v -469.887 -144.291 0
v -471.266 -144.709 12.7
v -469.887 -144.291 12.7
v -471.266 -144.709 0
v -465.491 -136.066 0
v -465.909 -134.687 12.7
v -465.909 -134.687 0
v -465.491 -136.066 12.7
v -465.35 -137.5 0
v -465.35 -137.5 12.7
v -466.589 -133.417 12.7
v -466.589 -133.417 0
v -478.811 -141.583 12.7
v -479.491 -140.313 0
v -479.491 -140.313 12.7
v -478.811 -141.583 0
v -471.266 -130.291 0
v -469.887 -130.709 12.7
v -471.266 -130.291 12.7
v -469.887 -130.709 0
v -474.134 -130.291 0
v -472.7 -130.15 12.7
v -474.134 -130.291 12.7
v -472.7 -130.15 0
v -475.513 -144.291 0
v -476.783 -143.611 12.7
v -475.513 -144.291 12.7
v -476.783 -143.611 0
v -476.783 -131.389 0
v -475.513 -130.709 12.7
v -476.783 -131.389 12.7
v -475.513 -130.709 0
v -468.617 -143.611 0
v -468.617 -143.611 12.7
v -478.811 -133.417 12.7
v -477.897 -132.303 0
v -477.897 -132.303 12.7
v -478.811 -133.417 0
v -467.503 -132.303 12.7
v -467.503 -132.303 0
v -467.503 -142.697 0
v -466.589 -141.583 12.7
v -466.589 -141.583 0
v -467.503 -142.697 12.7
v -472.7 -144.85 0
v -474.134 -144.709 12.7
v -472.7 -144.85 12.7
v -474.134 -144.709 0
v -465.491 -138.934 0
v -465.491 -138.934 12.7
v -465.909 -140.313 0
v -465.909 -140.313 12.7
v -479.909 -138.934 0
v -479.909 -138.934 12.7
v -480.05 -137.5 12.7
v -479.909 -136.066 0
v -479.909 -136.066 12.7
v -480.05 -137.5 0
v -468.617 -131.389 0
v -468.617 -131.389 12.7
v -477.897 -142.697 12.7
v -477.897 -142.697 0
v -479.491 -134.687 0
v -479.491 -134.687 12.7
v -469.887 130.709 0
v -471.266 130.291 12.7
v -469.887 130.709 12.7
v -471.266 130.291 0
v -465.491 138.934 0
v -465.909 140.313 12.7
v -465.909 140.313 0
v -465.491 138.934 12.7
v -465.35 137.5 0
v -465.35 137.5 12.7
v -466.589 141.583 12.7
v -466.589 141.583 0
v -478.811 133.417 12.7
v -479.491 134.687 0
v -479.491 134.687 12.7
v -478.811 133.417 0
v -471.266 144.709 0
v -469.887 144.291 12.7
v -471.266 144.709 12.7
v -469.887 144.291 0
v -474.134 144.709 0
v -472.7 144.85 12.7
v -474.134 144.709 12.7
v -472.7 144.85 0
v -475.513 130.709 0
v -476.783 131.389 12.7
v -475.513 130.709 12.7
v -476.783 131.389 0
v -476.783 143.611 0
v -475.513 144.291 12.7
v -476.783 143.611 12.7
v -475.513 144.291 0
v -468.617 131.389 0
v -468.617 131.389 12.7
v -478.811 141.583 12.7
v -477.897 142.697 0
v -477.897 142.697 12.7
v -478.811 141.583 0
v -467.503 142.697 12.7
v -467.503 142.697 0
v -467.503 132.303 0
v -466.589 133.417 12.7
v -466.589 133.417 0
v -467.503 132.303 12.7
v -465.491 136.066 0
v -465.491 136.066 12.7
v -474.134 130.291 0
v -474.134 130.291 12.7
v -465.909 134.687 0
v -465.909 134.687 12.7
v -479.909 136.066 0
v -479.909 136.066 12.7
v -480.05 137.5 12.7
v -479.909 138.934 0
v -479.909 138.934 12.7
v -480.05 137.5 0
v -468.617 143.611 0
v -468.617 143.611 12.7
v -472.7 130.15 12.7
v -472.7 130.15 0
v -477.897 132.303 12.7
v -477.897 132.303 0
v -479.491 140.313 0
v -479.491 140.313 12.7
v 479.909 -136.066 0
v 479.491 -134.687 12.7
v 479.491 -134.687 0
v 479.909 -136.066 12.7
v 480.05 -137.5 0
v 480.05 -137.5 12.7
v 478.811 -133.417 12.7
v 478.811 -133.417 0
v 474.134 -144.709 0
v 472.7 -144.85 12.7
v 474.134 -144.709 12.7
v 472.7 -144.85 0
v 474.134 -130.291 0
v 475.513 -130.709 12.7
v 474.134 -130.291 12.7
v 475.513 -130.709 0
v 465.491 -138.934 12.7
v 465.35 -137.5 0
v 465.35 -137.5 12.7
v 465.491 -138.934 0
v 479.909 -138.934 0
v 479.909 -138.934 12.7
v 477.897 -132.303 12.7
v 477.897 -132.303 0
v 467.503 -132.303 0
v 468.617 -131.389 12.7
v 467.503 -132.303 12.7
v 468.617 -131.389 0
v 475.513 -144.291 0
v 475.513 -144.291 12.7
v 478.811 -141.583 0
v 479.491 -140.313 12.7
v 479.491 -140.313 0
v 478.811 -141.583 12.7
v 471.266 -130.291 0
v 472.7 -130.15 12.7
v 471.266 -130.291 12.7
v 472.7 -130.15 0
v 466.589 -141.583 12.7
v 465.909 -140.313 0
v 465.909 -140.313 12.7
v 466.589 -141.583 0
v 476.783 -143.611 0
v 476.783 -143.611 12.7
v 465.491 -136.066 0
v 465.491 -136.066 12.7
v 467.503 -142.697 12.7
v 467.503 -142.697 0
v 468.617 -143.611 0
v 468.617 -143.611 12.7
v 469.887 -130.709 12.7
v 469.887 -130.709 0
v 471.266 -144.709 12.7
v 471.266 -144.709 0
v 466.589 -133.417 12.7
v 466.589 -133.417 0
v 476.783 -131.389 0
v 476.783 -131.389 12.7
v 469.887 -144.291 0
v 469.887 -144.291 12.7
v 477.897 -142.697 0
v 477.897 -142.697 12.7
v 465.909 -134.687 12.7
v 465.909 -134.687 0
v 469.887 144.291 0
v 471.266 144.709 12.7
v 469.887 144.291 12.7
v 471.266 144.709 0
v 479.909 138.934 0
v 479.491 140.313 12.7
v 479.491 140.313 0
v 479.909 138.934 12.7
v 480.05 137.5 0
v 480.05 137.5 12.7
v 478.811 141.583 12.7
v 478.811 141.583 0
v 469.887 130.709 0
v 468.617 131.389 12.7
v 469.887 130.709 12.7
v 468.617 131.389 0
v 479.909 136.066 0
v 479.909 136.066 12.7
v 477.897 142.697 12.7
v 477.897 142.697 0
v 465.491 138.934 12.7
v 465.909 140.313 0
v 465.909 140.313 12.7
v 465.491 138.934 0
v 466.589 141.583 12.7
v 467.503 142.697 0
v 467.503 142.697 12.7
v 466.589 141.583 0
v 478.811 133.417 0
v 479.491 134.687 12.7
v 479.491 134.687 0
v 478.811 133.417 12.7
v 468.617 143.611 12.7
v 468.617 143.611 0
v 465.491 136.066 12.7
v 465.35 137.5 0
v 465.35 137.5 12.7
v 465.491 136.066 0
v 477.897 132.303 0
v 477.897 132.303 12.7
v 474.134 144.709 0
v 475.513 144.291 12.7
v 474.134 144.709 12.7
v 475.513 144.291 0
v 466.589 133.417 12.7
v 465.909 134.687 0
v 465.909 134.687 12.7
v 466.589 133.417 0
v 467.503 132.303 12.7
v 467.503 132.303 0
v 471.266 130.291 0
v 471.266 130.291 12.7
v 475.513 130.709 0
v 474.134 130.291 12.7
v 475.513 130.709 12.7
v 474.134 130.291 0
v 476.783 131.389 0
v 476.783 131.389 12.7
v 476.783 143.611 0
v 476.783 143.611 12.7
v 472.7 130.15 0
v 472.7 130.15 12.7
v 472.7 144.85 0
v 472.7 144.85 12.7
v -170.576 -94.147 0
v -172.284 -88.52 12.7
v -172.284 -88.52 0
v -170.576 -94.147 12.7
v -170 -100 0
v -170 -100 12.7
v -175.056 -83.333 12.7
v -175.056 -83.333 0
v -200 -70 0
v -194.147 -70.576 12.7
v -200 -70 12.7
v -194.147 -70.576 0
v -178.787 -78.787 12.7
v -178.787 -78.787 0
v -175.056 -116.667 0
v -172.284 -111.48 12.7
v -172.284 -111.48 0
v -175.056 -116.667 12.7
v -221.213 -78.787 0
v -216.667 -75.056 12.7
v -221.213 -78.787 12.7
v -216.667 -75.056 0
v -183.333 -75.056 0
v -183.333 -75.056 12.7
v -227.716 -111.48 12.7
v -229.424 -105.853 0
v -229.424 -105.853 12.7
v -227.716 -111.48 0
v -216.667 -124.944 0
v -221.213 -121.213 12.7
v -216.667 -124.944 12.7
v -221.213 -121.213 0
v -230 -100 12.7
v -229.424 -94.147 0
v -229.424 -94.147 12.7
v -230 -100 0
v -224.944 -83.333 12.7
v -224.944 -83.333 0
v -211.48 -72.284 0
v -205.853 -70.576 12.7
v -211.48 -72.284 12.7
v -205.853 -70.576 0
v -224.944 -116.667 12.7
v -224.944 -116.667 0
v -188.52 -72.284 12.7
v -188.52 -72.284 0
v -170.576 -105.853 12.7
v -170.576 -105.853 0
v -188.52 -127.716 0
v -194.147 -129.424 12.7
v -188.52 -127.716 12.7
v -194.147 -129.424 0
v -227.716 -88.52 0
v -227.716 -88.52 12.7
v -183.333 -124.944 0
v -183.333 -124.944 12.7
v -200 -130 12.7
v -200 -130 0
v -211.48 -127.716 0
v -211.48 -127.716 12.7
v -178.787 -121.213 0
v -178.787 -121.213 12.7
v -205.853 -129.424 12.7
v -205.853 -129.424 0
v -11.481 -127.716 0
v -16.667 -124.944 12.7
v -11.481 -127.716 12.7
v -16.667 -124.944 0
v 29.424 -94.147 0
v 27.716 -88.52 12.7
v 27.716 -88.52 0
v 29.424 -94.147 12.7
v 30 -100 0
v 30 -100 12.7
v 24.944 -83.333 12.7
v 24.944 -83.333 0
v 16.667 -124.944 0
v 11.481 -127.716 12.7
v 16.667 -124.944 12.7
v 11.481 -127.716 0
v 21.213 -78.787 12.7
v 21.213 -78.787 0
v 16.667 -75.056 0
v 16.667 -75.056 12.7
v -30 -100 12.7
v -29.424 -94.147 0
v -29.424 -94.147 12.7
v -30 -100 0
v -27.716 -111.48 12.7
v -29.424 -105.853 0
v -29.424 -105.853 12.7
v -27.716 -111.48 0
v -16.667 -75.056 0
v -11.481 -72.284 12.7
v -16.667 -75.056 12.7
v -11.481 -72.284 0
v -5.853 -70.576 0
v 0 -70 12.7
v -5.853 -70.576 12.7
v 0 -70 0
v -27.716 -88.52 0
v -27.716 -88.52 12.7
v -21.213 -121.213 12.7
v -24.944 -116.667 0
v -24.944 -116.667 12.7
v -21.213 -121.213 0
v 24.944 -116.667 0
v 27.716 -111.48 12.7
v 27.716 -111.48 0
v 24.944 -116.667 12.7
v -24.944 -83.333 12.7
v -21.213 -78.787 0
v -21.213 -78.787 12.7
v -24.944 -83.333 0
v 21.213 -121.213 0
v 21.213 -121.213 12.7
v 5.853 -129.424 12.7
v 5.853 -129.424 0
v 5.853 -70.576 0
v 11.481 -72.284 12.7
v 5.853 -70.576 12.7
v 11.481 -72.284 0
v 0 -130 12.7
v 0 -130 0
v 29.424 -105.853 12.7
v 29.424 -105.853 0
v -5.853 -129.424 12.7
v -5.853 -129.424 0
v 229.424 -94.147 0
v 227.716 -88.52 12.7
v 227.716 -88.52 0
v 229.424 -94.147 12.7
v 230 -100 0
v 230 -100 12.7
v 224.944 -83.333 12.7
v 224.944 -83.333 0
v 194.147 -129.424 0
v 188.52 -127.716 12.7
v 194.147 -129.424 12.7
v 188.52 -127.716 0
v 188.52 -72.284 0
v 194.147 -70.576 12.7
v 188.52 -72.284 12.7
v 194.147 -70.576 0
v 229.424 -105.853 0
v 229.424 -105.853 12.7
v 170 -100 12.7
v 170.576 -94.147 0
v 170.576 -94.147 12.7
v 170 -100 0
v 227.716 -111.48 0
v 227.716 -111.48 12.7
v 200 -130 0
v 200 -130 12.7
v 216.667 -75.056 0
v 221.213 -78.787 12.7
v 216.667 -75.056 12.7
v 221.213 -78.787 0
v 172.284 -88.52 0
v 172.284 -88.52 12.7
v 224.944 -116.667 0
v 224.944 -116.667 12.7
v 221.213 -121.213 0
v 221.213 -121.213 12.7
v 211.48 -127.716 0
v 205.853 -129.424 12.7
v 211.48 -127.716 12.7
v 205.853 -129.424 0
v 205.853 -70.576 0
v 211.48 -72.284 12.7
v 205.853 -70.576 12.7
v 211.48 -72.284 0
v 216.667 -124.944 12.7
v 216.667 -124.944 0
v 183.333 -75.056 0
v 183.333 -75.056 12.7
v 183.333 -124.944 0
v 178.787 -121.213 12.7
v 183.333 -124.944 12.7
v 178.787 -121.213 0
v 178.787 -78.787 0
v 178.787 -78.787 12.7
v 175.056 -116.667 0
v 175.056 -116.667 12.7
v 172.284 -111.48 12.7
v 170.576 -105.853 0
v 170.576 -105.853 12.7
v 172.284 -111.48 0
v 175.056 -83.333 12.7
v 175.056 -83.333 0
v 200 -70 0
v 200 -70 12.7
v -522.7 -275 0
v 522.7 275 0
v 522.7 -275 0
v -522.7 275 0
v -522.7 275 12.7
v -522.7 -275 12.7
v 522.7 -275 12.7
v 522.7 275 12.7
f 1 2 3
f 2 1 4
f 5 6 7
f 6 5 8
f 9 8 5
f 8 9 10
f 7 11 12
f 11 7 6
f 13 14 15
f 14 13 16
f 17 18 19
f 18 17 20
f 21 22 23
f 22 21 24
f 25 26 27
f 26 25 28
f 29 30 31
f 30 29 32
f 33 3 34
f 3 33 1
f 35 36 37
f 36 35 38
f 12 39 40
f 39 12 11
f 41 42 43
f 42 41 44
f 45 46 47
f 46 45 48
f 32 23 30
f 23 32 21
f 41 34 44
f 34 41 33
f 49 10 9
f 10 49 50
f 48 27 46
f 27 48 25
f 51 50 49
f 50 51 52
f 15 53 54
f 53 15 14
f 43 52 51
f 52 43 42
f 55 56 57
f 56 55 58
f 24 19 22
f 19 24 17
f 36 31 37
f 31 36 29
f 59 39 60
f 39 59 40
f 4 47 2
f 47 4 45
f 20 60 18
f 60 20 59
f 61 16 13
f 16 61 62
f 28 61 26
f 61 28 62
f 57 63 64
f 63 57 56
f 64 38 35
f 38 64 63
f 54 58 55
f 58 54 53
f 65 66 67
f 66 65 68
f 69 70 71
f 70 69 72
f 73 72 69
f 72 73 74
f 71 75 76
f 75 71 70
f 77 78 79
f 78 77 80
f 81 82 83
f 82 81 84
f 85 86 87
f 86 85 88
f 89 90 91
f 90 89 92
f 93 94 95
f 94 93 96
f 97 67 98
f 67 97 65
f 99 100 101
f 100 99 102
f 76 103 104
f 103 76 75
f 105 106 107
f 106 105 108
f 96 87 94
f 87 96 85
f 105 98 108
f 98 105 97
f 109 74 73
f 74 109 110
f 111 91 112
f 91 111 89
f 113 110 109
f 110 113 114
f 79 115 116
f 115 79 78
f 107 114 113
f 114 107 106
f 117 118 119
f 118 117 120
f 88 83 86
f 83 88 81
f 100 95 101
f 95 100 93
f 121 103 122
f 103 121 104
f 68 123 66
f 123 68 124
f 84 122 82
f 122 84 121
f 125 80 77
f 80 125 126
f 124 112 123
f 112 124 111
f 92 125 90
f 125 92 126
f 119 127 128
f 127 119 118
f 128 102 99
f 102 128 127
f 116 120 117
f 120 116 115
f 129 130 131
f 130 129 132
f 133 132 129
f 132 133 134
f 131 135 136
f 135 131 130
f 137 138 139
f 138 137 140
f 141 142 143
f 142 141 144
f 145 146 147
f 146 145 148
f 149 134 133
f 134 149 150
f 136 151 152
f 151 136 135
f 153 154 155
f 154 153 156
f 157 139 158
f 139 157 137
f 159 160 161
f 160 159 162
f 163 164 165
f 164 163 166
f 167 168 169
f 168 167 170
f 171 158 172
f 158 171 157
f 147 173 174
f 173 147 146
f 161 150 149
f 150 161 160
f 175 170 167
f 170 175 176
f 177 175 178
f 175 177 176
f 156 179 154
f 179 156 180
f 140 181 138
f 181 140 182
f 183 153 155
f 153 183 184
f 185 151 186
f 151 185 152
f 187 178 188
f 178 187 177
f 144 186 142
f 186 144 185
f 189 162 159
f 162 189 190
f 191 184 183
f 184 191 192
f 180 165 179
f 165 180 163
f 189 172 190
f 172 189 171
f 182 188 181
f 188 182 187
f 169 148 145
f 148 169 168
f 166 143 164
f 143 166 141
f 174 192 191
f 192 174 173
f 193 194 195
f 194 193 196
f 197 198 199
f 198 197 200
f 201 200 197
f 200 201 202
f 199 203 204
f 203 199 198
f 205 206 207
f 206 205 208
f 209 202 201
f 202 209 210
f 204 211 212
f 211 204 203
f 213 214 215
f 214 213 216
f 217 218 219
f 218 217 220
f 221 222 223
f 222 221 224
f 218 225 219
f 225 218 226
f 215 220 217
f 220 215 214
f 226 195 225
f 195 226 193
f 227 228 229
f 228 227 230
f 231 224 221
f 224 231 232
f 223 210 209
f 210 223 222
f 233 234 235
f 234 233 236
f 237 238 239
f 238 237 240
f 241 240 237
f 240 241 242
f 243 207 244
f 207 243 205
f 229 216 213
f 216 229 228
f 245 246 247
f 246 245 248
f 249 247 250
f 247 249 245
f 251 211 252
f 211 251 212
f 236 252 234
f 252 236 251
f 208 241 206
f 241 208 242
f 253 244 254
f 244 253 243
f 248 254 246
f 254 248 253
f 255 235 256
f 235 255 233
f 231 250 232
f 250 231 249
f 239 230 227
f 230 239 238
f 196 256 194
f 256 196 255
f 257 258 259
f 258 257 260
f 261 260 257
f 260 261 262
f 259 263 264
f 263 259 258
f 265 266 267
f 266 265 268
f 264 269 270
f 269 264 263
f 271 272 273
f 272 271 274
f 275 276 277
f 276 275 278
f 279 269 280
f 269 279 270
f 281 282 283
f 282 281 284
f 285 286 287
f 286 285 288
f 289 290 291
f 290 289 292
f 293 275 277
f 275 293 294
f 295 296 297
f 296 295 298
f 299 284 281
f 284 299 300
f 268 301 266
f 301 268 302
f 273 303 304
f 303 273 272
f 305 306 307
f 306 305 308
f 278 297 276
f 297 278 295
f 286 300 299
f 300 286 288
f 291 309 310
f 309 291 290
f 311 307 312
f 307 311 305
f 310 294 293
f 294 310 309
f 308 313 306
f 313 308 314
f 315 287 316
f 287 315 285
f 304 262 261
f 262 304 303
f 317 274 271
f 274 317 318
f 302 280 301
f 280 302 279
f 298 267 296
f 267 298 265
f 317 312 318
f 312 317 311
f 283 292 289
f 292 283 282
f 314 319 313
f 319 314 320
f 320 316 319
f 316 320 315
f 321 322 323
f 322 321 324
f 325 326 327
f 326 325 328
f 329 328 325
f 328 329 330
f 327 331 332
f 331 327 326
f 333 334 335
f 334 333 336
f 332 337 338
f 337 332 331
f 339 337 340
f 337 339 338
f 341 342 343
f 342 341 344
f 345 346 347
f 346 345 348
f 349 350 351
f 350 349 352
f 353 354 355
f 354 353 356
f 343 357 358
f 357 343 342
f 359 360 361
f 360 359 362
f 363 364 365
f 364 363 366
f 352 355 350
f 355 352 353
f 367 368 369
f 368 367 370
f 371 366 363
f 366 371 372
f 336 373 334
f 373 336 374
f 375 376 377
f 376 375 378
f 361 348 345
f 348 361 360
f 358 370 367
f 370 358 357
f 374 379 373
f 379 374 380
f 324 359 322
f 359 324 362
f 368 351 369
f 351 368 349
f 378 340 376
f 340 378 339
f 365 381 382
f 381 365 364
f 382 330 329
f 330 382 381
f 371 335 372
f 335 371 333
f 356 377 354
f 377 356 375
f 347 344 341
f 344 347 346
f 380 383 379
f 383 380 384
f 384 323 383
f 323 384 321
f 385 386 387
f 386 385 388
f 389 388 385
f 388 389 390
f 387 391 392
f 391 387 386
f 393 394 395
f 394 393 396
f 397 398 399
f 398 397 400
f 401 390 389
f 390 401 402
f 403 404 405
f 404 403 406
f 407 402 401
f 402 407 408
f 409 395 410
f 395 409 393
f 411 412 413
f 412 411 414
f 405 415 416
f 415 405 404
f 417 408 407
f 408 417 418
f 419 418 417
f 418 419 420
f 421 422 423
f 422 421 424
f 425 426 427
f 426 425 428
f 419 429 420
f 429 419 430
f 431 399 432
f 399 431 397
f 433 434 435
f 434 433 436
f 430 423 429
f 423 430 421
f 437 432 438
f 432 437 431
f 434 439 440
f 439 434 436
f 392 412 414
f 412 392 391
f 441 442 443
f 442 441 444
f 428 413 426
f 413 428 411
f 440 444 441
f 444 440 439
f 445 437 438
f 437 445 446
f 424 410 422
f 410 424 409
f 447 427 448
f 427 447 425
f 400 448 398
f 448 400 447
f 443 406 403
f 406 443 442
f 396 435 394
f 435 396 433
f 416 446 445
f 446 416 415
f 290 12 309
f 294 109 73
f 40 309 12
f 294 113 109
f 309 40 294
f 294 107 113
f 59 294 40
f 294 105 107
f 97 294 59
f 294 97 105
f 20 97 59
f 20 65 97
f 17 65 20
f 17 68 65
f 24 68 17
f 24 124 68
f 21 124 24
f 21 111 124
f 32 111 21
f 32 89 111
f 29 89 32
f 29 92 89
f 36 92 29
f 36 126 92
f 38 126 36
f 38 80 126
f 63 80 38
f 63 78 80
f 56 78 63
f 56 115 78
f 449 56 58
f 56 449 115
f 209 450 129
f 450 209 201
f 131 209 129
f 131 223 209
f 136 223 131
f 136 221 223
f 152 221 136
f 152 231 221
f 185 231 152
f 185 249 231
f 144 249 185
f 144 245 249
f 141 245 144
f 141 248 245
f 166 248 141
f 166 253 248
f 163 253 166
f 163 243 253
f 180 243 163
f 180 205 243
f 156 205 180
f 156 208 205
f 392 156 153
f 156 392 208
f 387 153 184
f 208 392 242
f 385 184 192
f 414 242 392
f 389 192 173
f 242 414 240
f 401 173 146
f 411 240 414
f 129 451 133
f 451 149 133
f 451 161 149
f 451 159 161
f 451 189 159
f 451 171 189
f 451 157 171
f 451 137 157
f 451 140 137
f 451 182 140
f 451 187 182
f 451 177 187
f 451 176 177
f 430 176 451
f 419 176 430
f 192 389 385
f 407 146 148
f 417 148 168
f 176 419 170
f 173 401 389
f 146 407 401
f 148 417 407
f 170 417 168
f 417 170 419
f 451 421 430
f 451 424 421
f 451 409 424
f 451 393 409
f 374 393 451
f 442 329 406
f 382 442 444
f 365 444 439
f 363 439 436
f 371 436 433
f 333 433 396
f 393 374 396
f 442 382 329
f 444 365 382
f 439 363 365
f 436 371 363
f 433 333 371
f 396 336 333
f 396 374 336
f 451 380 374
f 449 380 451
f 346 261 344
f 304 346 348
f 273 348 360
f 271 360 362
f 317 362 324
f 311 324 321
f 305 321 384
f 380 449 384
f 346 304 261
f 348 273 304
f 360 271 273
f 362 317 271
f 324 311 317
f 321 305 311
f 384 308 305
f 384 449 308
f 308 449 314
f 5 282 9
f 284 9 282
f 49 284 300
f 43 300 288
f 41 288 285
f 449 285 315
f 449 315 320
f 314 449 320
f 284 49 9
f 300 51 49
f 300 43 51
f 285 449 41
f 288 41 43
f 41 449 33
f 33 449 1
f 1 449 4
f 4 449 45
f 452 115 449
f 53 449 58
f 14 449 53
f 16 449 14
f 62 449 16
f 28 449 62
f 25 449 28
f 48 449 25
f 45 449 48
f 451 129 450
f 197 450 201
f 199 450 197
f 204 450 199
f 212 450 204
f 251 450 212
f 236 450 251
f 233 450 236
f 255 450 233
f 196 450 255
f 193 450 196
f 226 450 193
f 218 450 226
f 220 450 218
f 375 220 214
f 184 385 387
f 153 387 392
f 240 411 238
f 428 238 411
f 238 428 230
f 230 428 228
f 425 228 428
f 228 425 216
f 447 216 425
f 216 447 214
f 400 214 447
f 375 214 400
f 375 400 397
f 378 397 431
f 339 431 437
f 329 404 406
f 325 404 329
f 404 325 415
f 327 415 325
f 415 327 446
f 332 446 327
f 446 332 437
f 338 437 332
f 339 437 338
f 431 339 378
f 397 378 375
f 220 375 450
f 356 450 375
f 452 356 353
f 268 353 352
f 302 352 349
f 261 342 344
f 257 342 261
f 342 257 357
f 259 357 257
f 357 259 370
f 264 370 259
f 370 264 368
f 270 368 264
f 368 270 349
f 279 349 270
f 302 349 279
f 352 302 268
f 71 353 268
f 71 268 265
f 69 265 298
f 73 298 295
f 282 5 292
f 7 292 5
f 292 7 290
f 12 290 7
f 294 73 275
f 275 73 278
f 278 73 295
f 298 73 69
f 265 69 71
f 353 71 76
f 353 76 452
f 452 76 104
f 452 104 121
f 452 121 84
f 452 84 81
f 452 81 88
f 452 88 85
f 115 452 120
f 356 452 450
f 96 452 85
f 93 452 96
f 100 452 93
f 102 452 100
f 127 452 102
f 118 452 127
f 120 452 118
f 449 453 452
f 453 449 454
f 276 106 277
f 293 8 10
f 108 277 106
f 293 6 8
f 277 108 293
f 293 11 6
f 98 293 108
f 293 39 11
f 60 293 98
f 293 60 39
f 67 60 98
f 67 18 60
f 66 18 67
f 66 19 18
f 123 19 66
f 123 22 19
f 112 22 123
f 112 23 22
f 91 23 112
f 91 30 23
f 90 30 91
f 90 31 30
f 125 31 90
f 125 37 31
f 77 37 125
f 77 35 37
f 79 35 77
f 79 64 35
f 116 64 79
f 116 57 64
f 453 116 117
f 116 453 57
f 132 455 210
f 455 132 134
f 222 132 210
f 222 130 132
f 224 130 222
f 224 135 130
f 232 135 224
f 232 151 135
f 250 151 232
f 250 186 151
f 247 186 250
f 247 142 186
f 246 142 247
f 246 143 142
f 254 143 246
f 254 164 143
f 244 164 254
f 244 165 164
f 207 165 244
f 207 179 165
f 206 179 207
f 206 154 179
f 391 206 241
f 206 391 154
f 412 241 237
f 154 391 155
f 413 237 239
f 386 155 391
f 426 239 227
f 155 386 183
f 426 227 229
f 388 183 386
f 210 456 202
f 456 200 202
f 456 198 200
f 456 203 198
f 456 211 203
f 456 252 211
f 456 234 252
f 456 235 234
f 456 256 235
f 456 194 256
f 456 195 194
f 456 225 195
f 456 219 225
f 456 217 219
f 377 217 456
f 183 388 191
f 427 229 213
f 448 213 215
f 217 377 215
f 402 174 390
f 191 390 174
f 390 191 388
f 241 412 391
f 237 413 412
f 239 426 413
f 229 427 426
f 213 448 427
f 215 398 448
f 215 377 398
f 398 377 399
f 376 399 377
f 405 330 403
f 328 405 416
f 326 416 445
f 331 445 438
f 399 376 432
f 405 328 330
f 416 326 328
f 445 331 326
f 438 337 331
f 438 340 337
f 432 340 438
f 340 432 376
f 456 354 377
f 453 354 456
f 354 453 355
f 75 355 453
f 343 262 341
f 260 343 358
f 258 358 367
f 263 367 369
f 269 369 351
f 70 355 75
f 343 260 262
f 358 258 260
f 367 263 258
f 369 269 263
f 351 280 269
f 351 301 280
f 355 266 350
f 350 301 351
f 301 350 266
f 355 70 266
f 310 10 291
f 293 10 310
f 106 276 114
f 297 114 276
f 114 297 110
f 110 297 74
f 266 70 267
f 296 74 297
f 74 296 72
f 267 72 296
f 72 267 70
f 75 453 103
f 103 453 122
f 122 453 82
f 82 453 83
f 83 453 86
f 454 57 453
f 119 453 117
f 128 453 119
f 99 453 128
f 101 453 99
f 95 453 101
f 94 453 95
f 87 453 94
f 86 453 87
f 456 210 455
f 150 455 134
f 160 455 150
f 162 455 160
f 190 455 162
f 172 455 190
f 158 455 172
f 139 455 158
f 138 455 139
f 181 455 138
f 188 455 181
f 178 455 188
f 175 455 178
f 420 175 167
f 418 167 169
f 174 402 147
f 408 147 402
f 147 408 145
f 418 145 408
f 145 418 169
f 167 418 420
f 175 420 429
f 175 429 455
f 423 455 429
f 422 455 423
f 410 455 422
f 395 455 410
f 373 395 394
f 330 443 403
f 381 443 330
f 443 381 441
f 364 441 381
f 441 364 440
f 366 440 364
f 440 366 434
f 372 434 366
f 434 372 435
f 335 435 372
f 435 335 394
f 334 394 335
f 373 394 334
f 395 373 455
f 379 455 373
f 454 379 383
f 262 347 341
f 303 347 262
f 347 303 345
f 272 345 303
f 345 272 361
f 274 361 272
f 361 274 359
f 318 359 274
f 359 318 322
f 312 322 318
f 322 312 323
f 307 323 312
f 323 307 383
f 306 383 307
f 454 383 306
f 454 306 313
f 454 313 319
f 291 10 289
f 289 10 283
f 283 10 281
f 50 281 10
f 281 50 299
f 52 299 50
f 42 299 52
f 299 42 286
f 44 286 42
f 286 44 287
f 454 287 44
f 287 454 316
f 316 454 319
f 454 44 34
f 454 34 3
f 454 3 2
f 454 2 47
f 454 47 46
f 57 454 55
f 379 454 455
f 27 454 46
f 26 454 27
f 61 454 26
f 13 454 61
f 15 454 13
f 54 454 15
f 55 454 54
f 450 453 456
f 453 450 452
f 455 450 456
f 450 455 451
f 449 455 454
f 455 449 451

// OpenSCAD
// file: ../lifetrac_v25_params.scad
// lifetrac_v25_params.scad
// Essential parameters for LifeTrac v25 individual parts
// This file contains only the constants needed for part design
// Full assembly uses lifetrac_v25.scad

// -----------------------------------------------------------------------------
// Compatibility helper
// OpenSCAD throws warnings when the BOSL2 helper `parent_modules()` is missing.
// We provide a stub that returns an empty list so part files can run cleanly
// when opened directly without pulling in BOSL2.
function parent_modules() = is_undef($parent_modules) ? [] : $parent_modules;

// =============================================================================
// MATERIAL CONSTANTS
// =============================================================================

PLATE_1_4_INCH = 6.35;   // 1/4" = 6.35mm
PLATE_1_2_INCH = 12.7;   // 1/2" = 12.7mm
PLATE_3_4_INCH = 19.05;  // 3/4" = 19.05mm
TUBE_3X3_1_4 = [76.2, 6.35];    // 3"x3" x 1/4" wall
TUBE_4X4_1_4 = [101.6, 6.35];   // 4"x4" x 1/4" wall (OSE standard)
TUBE_2X2_1_4 = [50.8, 6.35];    // 2"x2" x 1/4" wall
TUBE_2X4_1_4 = [50.8, 101.6, 6.35]; // 2"x4" rectangular

// Bolt/pin diameters
PIVOT_PIN_DIA = 38.1;    // 1.5" pivot pin
BOLT_DIA_1_2 = 12.7;     // 1/2" bolt
BOLT_DIA_3_4 = 19.05;    // 3/4" bolt
BOLT_DIA_1 = 25.4;       // 1" bolt

// =============================================================================
// MACHINE DIMENSIONS
// =============================================================================

// Target size: between Toro Dingo (915mm wide) and Bobcat (1830mm wide)
MACHINE_WIDTH = 1200;    // Overall width
MACHINE_LENGTH = 1800;   // Overall length
MACHINE_HEIGHT = 1000;   // Height to top of frame
WHEEL_BASE = 1400;       // Distance between front and rear axles
TRACK_WIDTH = 900;       // Distance between centerlines of left/right side panels

// Side panel sandwich configuration
SANDWICH_SPACING = 120;  // Gap between inner and outer panels (for arm pivot)
PANEL_THICKNESS = PLATE_1_2_INCH;

// Wheel dimensions
WHEEL_DIAMETER = 500;    // 500mm diameter wheels
WHEEL_WIDTH = 200;       // 200mm wide wheels
WHEEL_CLEARANCE = 50;    // Clearance between wheel and outer panel

// Ground clearance - bottom of frame above ground
GROUND_CLEARANCE = 150;  // 150mm ground clearance under frame
WHEEL_RADIUS = WHEEL_DIAMETER / 2;

// Frame sits with bottom at GROUND_CLEARANCE height
FRAME_Z_OFFSET = GROUND_CLEARANCE;

// Calculate wheel X offset - wheels positioned outside the outer panels
WHEEL_X_OFFSET = TRACK_WIDTH/2 + SANDWICH_SPACING/2 + PANEL_THICKNESS + WHEEL_WIDTH/2 + WHEEL_CLEARANCE;

// =============================================================================
// LOADER ARM DIMENSIONS
// =============================================================================

// Design constraints
BUCKET_GROUND_CLEARANCE = 0;      // Bucket bottom at ground level when lowered
BUCKET_FRONT_CLEARANCE = 100;     // 100mm (~4") clearance between bucket back and front of machine

// Arm pivot point (at top rear of side panels - tall end)
ARM_PIVOT_Y = 200;  // Near rear of machine, between sandwich plates  
ARM_PIVOT_Z_HEIGHT = MACHINE_HEIGHT - 50;  // Height above frame bottom
ARM_PIVOT_Z = FRAME_Z_OFFSET + ARM_PIVOT_Z_HEIGHT;  // Absolute Z position

// Calculate required arm length
MIN_HORIZONTAL_REACH = WHEEL_BASE + BUCKET_FRONT_CLEARANCE - ARM_PIVOT_Y;
ARM_LENGTH = ceil(sqrt(pow(ARM_PIVOT_Z, 2) + pow(MIN_HORIZONTAL_REACH, 2)));
ARM_GROUND_ANGLE = asin(ARM_PIVOT_Z / ARM_LENGTH);  // Angle below horizontal (degrees)

ARM_TUBE_SIZE = TUBE_3X3_1_4;         // 3"x3" arm tubing
ARM_SPACING = TRACK_WIDTH;            // Distance between arm centerlines

// Arm angle limits
ARM_MIN_ANGLE = -ARM_GROUND_ANGLE;     // Lowest position (at ground)
ARM_MAX_ANGLE = 60;                     // Maximum raised position

// Cross beam configuration
CROSS_BEAM_SIZE = TUBE_2X2_1_4[0];    // 2"x2" tube size
CROSS_BEAM_CLEARANCE = 15;             // Extra clearance around cross beam in cutout
CROSS_BEAM_1_POS = ARM_LENGTH * 0.65;   // First cross beam position
CROSS_BEAM_2_POS = ARM_LENGTH * 0.95;   // Second cross beam position (near bucket)

// Pivot position in panel coordinates (for arc slot calculations)
PIVOT_PANEL_X = ARM_PIVOT_Y;                          // Pivot X in panel coords
PIVOT_PANEL_Y = ARM_PIVOT_Z - FRAME_Z_OFFSET;         // Pivot Y in panel coords

// =============================================================================
// HYDRAULIC CYLINDER MOUNTING POINTS
// =============================================================================

// Lift cylinder mounting points (arms pivot at rear, cylinders attach forward)
LIFT_CYL_BASE_Y = WHEEL_BASE * 0.5;          // Base mount Y position (forward of pivot)
LIFT_CYL_BASE_Z = FRAME_Z_OFFSET + MACHINE_HEIGHT * 0.4;      // Base mount Z position
LIFT_CYL_ARM_OFFSET = ARM_LENGTH * 0.25;     // Attachment point along arm from pivot (proportional)

// =============================================================================
// BUCKET DIMENSIONS
// =============================================================================

BOBCAT_QA_WIDTH = 1168;           // 46" standard width
BOBCAT_QA_HEIGHT = 457;           // 18" plate height
BOBCAT_QA_PIN_DIA = 25.4;         // 1" locking pin

BUCKET_WIDTH = 1100;              // Slightly narrower than QA plate
BUCKET_DEPTH = 600;
BUCKET_HEIGHT = 450;

// =============================================================================
// STANDING DECK DIMENSIONS
// =============================================================================

DECK_WIDTH = 700;
DECK_DEPTH = 400;
DECK_HEIGHT = 250;  // Height above ground
// main file
// rear_crossmember.scad
// Rear crossmember plate for LifeTrac v25
// Connects left and right side panels at the rear

include <../lifetrac_v25_params.scad>

module rear_crossmember() {
    back_height = MACHINE_HEIGHT * 0.55;
    crossmember_width = TRACK_WIDTH + SANDWICH_SPACING + PANEL_THICKNESS * 2;
    plate_thickness = PANEL_THICKNESS;

    // Lay the plate flat in XY so projection captures all features
    difference() {
        // Main plate
        linear_extrude(height=plate_thickness)
        square([crossmember_width, back_height], center=true);

        // Bolt holes for mounting to side panels (4 per side)
        for (side = [-1, 1]) {
            x_pos = side * (crossmember_width/2 - 50);
            for (z_pos = [back_height/4, back_height * 3/4]) {
                y_pos = z_pos - back_height/2; // shift because square is centered
                translate([x_pos, y_pos, plate_thickness/2])
                cylinder(d=BOLT_DIA_1_2 + 2, h=plate_thickness+4, center=true, $fn=32);
            }
        }

        // Lightening holes to reduce weight
        for (x = [-200, 0, 200]) {
            y_pos = (back_height/2 - 100) - back_height/2; // place 100mm below top edge
            translate([x, y_pos, plate_thickness/2])
            cylinder(d=60, h=plate_thickness+4, center=true, $fn=32);
        }
    }
}

// Render the part for preview/export
if ($preview || len(search("rear_crossmember.scad", parent_modules())) == 0) {
    rear_crossmember();
}
